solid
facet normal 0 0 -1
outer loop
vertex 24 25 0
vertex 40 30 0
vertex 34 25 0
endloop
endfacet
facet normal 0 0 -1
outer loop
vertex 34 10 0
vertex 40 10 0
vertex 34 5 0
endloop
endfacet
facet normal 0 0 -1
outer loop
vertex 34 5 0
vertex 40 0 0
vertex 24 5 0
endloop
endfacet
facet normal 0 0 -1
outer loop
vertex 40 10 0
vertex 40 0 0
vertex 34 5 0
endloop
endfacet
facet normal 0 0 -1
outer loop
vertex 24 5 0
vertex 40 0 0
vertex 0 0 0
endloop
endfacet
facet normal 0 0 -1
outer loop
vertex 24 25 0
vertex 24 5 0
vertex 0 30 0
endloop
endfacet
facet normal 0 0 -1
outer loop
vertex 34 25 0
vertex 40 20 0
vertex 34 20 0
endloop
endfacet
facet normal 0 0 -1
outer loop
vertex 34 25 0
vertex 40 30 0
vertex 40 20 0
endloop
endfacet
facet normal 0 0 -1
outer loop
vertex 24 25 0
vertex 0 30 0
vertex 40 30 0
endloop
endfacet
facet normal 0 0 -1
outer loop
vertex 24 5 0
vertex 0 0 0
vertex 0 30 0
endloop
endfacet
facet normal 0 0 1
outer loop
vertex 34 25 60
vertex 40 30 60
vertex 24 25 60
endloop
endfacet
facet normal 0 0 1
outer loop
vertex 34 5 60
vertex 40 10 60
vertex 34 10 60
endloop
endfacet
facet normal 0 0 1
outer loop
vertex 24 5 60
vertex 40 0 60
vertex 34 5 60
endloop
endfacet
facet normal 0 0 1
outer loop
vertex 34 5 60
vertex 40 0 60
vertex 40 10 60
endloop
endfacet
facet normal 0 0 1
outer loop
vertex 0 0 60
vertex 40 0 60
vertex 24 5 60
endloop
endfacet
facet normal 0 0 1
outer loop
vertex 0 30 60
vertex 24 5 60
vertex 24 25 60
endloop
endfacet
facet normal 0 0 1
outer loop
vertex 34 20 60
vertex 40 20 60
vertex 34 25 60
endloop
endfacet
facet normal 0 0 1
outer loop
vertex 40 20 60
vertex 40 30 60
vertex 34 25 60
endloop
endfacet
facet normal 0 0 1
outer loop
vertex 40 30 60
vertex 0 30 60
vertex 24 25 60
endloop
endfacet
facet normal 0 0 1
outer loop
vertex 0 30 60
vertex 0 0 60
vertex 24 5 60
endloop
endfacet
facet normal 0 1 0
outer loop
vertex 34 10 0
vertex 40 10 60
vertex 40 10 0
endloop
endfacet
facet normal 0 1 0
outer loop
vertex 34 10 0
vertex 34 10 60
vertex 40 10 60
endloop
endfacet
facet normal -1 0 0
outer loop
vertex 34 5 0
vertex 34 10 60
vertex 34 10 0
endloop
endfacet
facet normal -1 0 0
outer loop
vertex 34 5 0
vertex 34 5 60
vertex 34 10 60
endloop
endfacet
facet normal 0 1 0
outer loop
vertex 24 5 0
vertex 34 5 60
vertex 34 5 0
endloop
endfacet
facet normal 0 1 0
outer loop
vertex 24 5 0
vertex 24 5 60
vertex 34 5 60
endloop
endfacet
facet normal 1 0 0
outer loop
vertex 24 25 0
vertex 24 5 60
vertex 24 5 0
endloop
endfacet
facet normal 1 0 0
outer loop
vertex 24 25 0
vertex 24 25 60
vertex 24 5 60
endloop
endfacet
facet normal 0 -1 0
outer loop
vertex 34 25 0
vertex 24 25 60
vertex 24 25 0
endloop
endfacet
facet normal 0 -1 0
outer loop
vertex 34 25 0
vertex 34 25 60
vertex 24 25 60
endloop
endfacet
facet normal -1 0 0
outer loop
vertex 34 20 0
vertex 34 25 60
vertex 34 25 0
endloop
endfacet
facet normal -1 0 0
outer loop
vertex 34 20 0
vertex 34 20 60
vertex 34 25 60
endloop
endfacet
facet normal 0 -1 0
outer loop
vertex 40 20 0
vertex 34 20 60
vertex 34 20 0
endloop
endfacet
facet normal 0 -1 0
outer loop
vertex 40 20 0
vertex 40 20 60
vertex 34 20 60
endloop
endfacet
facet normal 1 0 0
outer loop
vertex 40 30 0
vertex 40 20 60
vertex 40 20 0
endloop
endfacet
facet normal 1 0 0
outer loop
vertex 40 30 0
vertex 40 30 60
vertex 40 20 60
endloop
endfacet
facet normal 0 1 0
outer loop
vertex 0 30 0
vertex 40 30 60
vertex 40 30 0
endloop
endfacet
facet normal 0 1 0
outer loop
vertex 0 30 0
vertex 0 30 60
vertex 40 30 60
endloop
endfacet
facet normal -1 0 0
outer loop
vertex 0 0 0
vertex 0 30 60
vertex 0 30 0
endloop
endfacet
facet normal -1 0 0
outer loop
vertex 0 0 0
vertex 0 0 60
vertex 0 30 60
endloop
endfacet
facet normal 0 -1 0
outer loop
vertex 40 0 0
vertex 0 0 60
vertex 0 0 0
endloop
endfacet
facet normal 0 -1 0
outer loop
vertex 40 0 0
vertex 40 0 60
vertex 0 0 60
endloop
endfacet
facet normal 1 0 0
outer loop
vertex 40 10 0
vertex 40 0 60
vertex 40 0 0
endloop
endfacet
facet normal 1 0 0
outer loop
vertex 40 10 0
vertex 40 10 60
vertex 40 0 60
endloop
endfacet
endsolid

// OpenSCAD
$fn = 32;

// ----------------------------------------------------------------------
// T-slot rail: 40 x 30 mm section, 60 mm long
// ----------------------------------------------------------------------

// --- parameters (mm) ---
profile_height = 60;      // extrusion height
profile_points = 12;      // points of the closed outline

profile = [[0, 0], [40, 0], [40, 10], [34, 10], [34, 5], [24, 5], [24, 25], [34, 25], [34, 20], [40, 20], [40, 30], [0, 30]];  // single closed polygon, 12 points, counter clockwise

// --- the one profile operation ---
linear_extrude(height = profile_height) polygon(points = profile);
